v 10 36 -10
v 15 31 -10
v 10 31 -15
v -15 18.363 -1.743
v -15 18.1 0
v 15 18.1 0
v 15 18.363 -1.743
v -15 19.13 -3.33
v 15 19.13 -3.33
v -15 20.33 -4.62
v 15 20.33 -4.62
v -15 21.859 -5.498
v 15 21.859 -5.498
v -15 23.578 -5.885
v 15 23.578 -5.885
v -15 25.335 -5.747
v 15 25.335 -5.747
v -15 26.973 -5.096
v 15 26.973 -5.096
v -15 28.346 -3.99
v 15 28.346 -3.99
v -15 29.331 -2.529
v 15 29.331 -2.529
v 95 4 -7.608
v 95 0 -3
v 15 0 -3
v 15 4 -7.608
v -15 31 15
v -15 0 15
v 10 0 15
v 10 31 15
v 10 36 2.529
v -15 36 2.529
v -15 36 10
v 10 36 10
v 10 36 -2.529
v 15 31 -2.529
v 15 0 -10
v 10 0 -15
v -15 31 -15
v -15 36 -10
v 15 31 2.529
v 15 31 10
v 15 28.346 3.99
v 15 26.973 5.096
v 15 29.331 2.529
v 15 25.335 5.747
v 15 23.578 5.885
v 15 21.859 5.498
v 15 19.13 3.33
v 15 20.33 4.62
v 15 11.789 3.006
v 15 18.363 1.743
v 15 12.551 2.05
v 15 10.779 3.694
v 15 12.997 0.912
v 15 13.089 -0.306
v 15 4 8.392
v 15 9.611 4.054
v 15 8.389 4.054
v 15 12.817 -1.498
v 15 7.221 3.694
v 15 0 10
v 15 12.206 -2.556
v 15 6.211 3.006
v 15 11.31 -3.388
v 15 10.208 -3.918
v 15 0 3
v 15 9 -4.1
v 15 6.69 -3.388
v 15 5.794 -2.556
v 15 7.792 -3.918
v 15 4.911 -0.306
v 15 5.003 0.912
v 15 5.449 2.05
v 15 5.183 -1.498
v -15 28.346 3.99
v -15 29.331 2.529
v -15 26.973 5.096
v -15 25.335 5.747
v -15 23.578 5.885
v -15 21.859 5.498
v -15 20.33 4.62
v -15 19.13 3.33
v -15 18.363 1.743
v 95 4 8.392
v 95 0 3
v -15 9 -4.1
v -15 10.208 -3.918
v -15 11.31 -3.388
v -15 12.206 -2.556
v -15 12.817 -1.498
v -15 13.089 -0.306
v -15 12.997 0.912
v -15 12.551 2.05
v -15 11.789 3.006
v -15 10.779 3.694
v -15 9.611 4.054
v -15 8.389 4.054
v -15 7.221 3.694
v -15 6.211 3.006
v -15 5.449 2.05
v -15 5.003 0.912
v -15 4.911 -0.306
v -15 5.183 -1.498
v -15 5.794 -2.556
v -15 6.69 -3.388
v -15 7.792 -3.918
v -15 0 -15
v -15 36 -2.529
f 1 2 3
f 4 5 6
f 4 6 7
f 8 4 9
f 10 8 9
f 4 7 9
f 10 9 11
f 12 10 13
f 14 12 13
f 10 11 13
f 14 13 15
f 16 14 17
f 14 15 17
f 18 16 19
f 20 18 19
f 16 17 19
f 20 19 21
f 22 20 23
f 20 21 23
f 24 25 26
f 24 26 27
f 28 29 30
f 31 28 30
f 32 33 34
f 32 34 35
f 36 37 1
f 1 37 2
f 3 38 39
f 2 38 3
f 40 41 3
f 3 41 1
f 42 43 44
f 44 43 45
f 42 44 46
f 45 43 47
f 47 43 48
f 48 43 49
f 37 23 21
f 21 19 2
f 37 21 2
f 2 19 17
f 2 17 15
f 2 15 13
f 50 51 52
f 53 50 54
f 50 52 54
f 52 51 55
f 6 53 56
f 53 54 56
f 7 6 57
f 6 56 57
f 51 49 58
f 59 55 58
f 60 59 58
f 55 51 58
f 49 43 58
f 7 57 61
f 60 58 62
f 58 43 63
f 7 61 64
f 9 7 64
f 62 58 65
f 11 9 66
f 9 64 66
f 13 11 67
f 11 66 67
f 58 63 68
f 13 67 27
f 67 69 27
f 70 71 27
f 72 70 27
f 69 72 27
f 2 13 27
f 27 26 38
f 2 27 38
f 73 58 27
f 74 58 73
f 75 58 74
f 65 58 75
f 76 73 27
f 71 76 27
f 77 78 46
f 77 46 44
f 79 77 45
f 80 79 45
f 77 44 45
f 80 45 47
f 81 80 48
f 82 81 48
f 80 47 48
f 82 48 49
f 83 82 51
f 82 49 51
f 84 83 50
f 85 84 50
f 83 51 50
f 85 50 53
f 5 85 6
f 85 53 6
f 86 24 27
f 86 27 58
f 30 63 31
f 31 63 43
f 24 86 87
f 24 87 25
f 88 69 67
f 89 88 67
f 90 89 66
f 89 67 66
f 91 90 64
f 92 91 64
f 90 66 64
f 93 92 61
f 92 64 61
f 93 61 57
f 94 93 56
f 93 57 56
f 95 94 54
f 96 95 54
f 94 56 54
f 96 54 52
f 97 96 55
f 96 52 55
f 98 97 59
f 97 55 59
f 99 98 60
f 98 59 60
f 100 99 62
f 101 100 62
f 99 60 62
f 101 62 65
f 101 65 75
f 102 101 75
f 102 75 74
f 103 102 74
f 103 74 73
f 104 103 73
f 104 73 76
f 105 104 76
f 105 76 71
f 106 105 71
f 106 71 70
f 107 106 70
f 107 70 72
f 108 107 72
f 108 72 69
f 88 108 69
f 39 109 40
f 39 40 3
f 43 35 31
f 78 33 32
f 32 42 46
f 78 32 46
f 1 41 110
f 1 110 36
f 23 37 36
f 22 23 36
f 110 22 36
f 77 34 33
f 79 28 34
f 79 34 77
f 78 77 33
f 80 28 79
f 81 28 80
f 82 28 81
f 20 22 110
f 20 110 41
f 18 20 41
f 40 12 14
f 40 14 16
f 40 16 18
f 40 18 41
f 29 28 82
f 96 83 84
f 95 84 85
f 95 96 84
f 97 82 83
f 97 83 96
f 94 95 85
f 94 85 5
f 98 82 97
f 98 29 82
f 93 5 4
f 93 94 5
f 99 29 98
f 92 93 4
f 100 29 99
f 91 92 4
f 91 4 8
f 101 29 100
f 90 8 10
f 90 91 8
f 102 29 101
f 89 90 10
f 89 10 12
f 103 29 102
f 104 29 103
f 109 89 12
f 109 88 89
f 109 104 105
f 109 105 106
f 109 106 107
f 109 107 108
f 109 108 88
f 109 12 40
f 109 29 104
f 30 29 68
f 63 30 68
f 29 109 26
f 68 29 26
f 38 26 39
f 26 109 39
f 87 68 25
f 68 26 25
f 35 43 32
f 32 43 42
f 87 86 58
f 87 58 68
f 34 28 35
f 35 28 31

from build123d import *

# Parameters (mm, degrees)
SKETCH2_W               = 30
SKETCH2_H               = 30
BOSS_EXTRUDE1_DEPTH     = 36
BOSS_EXTRUDE2_DEPTH     = 80
SKETCH5_R               = 4.1
CUT_EXTRUDE1_DEPTH      = 80
CUT_EXTRUDE2_DEPTH      = 80
CUT_EXTRUDE2_DEPTH_BACK = 80
CHAMFER1_SIZE           = 5


with BuildPart() as part:
    # Sketch2 → Boss-Extrude1 (new body)
    with BuildSketch(Plane(origin=(0, 0, 0), x_dir=(1, 0, 0), z_dir=(0, 1, 0))):
        Rectangle(SKETCH2_W, SKETCH2_H)
    extrude(amount=BOSS_EXTRUDE1_DEPTH)

    # Sketch4 → Boss-Extrude2 (add)
    with BuildSketch(Plane(origin=(15, 0, 0), x_dir=(0, 0, -1), z_dir=(1, 0, 0))):
        Polygon((-8.392439038, 4), (-3, 0), (0, 0), (3, 0), (7.607560962, 4), align=None)
    extrude(amount=BOSS_EXTRUDE2_DEPTH)

    # Sketch5 → Cut-Extrude1 (cut)
    with BuildSketch(Plane(origin=(15, 0, 0), x_dir=(0, 0, -1), z_dir=(1, 0, 0))):
        with Locations((0, 9)):
            Circle(SKETCH5_R)
    extrude(amount=-CUT_EXTRUDE1_DEPTH, mode=Mode.SUBTRACT)

    # Sketch6 → Cut-Extrude2 (cut, two sides: drawn at the far end of the back side and taken through both)
    with BuildSketch(Plane(origin=(15, 0, 0), x_dir=(0, 0, -1), z_dir=(1, 0, 0)).offset(-CUT_EXTRUDE2_DEPTH_BACK)):
        with BuildLine():
            Line((2.528554435, 36.330541101), (-2.528554435, 36.330541101))
            Line((-2.528554435, 36.330541101), (-2.528554435, 29.330704688))
            ThreePointArc((-2.528554435, 29.330704688), (-5.755916854, 22.704075168), (0, 18.1))
            ThreePointArc((0, 18.1), (5.755916854, 22.704075168), (2.528554435, 29.330704688))
            Line((2.528554435, 29.330704688), (2.528554435, 36.330541101))
        make_face()
    extrude(amount=CUT_EXTRUDE2_DEPTH + CUT_EXTRUDE2_DEPTH_BACK, mode=Mode.SUBTRACT)

    # Chamfer1
    chamfer1_edges = [part.edges().sort_by_distance(p)[0] for p in [
        (15, 36, -8.764277217),
        (0, 36, -15),
        (15, 36, 8.764277217),
        (0, 36, 15),
        (15, 18, -15),
        (15, 18, 15),
    ]]
    chamfer(chamfer1_edges, length=CHAMFER1_SIZE)


solid = part.part
